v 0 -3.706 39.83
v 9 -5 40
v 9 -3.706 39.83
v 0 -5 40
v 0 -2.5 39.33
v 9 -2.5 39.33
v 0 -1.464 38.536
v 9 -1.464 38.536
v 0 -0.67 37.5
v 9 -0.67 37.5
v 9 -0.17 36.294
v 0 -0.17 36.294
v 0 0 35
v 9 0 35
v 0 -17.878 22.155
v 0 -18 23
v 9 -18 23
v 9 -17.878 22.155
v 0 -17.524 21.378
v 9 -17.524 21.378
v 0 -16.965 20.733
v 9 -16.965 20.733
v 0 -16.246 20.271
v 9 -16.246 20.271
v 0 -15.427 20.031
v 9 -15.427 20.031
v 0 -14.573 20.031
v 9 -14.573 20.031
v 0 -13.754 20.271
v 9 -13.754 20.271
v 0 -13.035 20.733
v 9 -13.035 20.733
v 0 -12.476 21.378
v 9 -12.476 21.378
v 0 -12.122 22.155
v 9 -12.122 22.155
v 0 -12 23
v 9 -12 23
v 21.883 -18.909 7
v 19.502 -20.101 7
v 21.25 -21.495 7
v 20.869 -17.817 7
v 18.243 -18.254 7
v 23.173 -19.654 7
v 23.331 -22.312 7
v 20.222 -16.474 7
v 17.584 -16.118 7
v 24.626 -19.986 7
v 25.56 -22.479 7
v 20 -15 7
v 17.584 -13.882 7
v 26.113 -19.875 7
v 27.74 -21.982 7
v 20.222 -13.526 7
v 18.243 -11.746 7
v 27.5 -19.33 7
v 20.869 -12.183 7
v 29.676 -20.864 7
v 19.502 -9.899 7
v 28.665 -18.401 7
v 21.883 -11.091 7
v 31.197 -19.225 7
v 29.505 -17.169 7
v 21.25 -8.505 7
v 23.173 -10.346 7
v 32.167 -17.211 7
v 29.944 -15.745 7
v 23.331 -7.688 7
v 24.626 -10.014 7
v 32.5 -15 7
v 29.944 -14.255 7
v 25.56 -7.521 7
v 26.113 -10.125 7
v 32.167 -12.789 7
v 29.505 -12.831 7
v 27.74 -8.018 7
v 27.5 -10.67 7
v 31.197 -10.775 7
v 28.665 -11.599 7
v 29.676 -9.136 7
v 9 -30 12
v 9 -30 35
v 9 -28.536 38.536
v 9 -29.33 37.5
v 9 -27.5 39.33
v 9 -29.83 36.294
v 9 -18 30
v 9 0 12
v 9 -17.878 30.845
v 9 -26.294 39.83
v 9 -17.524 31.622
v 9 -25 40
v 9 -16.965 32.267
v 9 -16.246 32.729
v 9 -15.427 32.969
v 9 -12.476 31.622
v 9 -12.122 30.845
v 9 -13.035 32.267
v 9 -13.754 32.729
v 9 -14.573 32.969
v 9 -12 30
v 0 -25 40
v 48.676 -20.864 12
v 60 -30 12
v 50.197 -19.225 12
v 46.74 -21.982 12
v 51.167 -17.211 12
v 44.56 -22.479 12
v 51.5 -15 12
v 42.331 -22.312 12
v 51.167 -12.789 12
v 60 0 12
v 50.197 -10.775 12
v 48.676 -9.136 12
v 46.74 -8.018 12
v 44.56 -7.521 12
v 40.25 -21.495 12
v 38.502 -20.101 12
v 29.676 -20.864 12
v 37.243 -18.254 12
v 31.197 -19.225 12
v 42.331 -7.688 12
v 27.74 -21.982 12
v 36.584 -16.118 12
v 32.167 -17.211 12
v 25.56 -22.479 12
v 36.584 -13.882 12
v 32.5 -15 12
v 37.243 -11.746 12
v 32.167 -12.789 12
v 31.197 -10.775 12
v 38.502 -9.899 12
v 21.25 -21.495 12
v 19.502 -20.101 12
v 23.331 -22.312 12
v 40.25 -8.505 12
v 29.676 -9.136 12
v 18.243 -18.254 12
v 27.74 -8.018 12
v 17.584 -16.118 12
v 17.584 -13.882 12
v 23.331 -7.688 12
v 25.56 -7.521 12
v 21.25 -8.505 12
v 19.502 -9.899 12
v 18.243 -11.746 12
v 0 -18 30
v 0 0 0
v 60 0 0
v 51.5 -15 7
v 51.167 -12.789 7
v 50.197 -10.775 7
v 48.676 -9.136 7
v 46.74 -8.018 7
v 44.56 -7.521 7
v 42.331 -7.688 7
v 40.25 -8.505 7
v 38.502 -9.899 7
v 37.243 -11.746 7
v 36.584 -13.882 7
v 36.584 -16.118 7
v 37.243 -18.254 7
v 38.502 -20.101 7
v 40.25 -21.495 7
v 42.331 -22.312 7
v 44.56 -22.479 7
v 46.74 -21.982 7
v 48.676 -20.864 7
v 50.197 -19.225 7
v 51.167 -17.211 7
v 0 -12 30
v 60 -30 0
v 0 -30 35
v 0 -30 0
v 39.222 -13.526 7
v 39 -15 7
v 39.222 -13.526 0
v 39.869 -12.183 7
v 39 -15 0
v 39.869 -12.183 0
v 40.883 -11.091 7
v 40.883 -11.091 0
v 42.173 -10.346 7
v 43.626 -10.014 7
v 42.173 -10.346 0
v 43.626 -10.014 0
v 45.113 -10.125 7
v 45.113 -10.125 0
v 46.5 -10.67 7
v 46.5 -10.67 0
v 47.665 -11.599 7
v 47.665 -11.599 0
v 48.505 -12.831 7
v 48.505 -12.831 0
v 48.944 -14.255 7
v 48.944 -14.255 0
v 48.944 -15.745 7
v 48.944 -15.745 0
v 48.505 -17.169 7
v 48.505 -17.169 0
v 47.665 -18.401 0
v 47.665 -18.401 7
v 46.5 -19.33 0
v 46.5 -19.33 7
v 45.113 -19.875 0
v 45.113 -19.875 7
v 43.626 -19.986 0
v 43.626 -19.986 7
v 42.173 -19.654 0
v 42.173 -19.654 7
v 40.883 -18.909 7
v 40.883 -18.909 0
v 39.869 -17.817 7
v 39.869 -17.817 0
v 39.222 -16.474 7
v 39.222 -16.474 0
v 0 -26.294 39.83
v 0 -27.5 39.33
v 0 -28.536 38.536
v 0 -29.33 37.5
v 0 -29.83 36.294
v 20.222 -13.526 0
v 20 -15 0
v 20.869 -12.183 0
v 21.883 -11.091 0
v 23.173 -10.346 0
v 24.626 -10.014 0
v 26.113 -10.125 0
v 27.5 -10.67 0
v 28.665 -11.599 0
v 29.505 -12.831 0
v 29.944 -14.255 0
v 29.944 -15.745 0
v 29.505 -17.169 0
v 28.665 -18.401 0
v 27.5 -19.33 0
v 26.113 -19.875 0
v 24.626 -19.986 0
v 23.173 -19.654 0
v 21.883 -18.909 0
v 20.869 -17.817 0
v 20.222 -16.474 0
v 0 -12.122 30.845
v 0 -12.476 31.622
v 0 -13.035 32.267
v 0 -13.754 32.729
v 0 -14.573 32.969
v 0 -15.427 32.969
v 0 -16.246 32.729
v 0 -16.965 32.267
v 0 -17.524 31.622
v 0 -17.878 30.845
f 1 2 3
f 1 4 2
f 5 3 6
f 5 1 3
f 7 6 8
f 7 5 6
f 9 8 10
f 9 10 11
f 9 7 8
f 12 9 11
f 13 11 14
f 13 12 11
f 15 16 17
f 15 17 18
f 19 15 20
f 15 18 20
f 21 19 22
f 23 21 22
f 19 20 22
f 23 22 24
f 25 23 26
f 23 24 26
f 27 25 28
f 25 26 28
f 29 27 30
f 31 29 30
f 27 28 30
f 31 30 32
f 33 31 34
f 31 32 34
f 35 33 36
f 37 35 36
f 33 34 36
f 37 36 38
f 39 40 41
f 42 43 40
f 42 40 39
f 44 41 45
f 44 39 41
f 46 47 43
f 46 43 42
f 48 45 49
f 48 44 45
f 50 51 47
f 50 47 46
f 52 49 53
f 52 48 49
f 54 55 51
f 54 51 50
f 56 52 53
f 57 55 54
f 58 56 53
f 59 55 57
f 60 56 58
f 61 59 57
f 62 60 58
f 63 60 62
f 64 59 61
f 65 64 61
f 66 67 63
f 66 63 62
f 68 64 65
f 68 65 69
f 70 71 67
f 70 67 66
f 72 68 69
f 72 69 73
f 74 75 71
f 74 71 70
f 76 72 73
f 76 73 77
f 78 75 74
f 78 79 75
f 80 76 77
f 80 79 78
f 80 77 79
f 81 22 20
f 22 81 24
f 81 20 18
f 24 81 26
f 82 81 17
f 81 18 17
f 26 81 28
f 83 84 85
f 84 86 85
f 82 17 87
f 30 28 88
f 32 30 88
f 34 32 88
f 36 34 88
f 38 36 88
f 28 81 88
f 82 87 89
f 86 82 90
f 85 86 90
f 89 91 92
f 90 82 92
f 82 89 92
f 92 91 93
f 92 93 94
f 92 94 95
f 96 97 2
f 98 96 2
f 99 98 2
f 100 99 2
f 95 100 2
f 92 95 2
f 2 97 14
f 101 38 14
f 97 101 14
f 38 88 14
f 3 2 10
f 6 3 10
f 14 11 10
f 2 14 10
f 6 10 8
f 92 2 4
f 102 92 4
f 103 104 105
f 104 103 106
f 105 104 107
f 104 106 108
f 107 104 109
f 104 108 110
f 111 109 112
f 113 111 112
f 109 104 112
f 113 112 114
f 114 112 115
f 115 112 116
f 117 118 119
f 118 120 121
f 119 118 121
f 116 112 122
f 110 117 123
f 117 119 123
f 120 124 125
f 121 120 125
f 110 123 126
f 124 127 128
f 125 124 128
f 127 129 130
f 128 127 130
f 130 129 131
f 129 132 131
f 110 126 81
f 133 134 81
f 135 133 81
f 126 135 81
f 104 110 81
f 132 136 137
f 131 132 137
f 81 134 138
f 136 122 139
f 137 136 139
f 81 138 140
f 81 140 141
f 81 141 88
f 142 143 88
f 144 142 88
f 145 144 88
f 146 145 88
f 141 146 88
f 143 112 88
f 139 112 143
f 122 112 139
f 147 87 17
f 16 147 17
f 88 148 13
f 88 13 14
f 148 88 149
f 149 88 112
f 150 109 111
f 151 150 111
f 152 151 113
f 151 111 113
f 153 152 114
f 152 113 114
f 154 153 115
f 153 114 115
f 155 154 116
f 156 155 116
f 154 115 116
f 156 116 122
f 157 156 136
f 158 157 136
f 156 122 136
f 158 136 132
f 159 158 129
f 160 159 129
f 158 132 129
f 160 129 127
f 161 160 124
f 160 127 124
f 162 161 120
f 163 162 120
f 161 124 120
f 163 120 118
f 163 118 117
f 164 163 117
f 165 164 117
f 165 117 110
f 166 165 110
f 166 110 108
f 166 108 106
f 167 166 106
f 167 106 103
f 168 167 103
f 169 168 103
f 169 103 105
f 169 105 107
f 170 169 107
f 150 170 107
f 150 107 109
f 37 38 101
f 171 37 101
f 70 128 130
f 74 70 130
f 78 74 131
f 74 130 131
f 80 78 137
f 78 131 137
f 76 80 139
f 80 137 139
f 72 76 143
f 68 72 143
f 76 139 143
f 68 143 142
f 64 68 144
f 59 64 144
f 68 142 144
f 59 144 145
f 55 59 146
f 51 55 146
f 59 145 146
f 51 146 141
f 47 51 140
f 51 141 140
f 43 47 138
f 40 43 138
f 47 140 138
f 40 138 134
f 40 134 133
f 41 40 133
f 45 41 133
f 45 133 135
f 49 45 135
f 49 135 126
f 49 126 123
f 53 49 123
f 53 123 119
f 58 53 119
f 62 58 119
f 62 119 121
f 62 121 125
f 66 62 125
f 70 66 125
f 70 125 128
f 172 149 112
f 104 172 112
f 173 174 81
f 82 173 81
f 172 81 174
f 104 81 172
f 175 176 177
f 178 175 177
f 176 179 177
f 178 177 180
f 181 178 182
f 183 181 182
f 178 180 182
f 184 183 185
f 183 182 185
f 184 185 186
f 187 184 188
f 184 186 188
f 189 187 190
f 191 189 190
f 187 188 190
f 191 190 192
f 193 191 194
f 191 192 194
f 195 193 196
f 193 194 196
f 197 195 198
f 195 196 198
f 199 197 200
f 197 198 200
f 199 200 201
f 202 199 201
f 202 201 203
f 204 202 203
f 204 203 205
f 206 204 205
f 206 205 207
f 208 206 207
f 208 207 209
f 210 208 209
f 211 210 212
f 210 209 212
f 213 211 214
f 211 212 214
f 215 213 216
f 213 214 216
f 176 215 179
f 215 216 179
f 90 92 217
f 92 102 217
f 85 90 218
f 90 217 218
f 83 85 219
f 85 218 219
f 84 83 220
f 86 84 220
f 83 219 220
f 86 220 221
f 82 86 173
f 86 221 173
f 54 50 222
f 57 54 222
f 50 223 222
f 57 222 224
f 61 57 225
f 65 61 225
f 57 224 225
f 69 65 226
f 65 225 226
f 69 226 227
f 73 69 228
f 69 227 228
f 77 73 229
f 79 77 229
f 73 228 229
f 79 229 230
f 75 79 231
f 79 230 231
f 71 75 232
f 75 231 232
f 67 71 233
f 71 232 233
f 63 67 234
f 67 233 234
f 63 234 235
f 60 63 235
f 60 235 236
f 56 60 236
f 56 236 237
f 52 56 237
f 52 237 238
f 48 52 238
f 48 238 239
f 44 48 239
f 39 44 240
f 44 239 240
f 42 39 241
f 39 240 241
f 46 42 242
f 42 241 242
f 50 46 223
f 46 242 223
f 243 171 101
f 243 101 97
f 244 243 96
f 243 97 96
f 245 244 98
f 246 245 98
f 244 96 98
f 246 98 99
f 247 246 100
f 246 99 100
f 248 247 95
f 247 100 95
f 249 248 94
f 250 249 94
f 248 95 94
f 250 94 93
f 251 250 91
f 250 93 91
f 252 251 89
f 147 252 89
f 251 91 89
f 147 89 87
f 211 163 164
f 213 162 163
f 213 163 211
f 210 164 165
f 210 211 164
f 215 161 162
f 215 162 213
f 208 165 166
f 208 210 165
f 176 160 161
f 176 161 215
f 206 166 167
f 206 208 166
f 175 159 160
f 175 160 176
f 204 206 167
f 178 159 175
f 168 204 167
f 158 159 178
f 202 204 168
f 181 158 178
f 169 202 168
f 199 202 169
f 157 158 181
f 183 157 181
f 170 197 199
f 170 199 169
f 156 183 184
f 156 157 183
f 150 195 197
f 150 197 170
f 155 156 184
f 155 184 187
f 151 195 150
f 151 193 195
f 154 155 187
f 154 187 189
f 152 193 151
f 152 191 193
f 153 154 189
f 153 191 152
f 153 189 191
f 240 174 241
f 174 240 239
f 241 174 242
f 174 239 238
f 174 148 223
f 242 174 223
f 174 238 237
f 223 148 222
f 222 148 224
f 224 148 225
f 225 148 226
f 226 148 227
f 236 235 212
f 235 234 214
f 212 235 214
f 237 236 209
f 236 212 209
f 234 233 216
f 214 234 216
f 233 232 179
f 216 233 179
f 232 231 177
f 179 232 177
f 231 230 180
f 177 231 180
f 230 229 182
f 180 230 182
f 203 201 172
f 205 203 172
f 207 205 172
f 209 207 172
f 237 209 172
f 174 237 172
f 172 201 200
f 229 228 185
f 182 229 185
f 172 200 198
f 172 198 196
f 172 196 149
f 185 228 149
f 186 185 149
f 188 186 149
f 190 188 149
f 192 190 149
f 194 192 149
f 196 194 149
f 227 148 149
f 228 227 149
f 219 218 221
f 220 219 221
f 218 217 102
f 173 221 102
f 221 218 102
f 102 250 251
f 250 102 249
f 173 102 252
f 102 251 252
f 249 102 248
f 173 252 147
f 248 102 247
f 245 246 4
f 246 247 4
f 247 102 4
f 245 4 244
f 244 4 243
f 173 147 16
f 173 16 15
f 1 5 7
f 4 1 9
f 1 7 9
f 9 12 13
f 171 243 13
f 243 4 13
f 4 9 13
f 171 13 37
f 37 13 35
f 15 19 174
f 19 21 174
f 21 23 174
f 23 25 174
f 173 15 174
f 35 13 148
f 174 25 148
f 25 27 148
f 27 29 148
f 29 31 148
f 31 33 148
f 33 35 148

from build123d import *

# Parameters (mm, degrees)
F1_DEPTH       = 30
F2_R           = 5
F3_R           = 5
F6_D           = 10
F6_CBORE_D     = 15
F6_CBORE_DEPTH = 5
F7_D           = 10
F7_CBORE_D     = 15
F7_CBORE_DEPTH = 5
F9_DEPTH       = 9.001


with BuildPart() as f1:
    # F0 (on Front) → F1 (new body)
    with BuildSketch(Plane.XZ):
        Polygon((0, 0), (60, 0), (60, 12), (9, 12), (9, 40), (0, 40), align=None)
    extrude(amount=F1_DEPTH)

    # F2
    f2_edges = [f1.edges().sort_by_distance(p)[0] for p in [
        (4.5, -30, 40),
    ]]
    fillet(f2_edges, radius=F2_R)

    # F3
    f3_edges = [f1.edges().sort_by_distance(p)[0] for p in [
        (4.5, 0, 40),
    ]]
    fillet(f3_edges, radius=F3_R)

    # F6 (through all)
    with Locations(Plane.XY.offset(12)):
        with Locations((44, -15)):
            CounterBoreHole(F6_D / 2, F6_CBORE_D / 2, F6_CBORE_DEPTH)

    # F7 (through all)
    with Locations(Plane.XY.offset(12)):
        with Locations((25, -15)):
            CounterBoreHole(F7_D / 2, F7_CBORE_D / 2, F7_CBORE_DEPTH)

    # F8 (on face) → F9 (cut, through all)
    with BuildSketch(Plane.YZ.offset(9)):
        with BuildLine():
            ThreePointArc((-12, 30), (-15, 33), (-18, 30))
            Line((-18, 30), (-18, 23))
            ThreePointArc((-18, 23), (-15, 20), (-12, 23))
            Line((-12, 23), (-12, 30))
        make_face()
    extrude(amount=-F9_DEPTH, mode=Mode.SUBTRACT)


solid = f1.part
